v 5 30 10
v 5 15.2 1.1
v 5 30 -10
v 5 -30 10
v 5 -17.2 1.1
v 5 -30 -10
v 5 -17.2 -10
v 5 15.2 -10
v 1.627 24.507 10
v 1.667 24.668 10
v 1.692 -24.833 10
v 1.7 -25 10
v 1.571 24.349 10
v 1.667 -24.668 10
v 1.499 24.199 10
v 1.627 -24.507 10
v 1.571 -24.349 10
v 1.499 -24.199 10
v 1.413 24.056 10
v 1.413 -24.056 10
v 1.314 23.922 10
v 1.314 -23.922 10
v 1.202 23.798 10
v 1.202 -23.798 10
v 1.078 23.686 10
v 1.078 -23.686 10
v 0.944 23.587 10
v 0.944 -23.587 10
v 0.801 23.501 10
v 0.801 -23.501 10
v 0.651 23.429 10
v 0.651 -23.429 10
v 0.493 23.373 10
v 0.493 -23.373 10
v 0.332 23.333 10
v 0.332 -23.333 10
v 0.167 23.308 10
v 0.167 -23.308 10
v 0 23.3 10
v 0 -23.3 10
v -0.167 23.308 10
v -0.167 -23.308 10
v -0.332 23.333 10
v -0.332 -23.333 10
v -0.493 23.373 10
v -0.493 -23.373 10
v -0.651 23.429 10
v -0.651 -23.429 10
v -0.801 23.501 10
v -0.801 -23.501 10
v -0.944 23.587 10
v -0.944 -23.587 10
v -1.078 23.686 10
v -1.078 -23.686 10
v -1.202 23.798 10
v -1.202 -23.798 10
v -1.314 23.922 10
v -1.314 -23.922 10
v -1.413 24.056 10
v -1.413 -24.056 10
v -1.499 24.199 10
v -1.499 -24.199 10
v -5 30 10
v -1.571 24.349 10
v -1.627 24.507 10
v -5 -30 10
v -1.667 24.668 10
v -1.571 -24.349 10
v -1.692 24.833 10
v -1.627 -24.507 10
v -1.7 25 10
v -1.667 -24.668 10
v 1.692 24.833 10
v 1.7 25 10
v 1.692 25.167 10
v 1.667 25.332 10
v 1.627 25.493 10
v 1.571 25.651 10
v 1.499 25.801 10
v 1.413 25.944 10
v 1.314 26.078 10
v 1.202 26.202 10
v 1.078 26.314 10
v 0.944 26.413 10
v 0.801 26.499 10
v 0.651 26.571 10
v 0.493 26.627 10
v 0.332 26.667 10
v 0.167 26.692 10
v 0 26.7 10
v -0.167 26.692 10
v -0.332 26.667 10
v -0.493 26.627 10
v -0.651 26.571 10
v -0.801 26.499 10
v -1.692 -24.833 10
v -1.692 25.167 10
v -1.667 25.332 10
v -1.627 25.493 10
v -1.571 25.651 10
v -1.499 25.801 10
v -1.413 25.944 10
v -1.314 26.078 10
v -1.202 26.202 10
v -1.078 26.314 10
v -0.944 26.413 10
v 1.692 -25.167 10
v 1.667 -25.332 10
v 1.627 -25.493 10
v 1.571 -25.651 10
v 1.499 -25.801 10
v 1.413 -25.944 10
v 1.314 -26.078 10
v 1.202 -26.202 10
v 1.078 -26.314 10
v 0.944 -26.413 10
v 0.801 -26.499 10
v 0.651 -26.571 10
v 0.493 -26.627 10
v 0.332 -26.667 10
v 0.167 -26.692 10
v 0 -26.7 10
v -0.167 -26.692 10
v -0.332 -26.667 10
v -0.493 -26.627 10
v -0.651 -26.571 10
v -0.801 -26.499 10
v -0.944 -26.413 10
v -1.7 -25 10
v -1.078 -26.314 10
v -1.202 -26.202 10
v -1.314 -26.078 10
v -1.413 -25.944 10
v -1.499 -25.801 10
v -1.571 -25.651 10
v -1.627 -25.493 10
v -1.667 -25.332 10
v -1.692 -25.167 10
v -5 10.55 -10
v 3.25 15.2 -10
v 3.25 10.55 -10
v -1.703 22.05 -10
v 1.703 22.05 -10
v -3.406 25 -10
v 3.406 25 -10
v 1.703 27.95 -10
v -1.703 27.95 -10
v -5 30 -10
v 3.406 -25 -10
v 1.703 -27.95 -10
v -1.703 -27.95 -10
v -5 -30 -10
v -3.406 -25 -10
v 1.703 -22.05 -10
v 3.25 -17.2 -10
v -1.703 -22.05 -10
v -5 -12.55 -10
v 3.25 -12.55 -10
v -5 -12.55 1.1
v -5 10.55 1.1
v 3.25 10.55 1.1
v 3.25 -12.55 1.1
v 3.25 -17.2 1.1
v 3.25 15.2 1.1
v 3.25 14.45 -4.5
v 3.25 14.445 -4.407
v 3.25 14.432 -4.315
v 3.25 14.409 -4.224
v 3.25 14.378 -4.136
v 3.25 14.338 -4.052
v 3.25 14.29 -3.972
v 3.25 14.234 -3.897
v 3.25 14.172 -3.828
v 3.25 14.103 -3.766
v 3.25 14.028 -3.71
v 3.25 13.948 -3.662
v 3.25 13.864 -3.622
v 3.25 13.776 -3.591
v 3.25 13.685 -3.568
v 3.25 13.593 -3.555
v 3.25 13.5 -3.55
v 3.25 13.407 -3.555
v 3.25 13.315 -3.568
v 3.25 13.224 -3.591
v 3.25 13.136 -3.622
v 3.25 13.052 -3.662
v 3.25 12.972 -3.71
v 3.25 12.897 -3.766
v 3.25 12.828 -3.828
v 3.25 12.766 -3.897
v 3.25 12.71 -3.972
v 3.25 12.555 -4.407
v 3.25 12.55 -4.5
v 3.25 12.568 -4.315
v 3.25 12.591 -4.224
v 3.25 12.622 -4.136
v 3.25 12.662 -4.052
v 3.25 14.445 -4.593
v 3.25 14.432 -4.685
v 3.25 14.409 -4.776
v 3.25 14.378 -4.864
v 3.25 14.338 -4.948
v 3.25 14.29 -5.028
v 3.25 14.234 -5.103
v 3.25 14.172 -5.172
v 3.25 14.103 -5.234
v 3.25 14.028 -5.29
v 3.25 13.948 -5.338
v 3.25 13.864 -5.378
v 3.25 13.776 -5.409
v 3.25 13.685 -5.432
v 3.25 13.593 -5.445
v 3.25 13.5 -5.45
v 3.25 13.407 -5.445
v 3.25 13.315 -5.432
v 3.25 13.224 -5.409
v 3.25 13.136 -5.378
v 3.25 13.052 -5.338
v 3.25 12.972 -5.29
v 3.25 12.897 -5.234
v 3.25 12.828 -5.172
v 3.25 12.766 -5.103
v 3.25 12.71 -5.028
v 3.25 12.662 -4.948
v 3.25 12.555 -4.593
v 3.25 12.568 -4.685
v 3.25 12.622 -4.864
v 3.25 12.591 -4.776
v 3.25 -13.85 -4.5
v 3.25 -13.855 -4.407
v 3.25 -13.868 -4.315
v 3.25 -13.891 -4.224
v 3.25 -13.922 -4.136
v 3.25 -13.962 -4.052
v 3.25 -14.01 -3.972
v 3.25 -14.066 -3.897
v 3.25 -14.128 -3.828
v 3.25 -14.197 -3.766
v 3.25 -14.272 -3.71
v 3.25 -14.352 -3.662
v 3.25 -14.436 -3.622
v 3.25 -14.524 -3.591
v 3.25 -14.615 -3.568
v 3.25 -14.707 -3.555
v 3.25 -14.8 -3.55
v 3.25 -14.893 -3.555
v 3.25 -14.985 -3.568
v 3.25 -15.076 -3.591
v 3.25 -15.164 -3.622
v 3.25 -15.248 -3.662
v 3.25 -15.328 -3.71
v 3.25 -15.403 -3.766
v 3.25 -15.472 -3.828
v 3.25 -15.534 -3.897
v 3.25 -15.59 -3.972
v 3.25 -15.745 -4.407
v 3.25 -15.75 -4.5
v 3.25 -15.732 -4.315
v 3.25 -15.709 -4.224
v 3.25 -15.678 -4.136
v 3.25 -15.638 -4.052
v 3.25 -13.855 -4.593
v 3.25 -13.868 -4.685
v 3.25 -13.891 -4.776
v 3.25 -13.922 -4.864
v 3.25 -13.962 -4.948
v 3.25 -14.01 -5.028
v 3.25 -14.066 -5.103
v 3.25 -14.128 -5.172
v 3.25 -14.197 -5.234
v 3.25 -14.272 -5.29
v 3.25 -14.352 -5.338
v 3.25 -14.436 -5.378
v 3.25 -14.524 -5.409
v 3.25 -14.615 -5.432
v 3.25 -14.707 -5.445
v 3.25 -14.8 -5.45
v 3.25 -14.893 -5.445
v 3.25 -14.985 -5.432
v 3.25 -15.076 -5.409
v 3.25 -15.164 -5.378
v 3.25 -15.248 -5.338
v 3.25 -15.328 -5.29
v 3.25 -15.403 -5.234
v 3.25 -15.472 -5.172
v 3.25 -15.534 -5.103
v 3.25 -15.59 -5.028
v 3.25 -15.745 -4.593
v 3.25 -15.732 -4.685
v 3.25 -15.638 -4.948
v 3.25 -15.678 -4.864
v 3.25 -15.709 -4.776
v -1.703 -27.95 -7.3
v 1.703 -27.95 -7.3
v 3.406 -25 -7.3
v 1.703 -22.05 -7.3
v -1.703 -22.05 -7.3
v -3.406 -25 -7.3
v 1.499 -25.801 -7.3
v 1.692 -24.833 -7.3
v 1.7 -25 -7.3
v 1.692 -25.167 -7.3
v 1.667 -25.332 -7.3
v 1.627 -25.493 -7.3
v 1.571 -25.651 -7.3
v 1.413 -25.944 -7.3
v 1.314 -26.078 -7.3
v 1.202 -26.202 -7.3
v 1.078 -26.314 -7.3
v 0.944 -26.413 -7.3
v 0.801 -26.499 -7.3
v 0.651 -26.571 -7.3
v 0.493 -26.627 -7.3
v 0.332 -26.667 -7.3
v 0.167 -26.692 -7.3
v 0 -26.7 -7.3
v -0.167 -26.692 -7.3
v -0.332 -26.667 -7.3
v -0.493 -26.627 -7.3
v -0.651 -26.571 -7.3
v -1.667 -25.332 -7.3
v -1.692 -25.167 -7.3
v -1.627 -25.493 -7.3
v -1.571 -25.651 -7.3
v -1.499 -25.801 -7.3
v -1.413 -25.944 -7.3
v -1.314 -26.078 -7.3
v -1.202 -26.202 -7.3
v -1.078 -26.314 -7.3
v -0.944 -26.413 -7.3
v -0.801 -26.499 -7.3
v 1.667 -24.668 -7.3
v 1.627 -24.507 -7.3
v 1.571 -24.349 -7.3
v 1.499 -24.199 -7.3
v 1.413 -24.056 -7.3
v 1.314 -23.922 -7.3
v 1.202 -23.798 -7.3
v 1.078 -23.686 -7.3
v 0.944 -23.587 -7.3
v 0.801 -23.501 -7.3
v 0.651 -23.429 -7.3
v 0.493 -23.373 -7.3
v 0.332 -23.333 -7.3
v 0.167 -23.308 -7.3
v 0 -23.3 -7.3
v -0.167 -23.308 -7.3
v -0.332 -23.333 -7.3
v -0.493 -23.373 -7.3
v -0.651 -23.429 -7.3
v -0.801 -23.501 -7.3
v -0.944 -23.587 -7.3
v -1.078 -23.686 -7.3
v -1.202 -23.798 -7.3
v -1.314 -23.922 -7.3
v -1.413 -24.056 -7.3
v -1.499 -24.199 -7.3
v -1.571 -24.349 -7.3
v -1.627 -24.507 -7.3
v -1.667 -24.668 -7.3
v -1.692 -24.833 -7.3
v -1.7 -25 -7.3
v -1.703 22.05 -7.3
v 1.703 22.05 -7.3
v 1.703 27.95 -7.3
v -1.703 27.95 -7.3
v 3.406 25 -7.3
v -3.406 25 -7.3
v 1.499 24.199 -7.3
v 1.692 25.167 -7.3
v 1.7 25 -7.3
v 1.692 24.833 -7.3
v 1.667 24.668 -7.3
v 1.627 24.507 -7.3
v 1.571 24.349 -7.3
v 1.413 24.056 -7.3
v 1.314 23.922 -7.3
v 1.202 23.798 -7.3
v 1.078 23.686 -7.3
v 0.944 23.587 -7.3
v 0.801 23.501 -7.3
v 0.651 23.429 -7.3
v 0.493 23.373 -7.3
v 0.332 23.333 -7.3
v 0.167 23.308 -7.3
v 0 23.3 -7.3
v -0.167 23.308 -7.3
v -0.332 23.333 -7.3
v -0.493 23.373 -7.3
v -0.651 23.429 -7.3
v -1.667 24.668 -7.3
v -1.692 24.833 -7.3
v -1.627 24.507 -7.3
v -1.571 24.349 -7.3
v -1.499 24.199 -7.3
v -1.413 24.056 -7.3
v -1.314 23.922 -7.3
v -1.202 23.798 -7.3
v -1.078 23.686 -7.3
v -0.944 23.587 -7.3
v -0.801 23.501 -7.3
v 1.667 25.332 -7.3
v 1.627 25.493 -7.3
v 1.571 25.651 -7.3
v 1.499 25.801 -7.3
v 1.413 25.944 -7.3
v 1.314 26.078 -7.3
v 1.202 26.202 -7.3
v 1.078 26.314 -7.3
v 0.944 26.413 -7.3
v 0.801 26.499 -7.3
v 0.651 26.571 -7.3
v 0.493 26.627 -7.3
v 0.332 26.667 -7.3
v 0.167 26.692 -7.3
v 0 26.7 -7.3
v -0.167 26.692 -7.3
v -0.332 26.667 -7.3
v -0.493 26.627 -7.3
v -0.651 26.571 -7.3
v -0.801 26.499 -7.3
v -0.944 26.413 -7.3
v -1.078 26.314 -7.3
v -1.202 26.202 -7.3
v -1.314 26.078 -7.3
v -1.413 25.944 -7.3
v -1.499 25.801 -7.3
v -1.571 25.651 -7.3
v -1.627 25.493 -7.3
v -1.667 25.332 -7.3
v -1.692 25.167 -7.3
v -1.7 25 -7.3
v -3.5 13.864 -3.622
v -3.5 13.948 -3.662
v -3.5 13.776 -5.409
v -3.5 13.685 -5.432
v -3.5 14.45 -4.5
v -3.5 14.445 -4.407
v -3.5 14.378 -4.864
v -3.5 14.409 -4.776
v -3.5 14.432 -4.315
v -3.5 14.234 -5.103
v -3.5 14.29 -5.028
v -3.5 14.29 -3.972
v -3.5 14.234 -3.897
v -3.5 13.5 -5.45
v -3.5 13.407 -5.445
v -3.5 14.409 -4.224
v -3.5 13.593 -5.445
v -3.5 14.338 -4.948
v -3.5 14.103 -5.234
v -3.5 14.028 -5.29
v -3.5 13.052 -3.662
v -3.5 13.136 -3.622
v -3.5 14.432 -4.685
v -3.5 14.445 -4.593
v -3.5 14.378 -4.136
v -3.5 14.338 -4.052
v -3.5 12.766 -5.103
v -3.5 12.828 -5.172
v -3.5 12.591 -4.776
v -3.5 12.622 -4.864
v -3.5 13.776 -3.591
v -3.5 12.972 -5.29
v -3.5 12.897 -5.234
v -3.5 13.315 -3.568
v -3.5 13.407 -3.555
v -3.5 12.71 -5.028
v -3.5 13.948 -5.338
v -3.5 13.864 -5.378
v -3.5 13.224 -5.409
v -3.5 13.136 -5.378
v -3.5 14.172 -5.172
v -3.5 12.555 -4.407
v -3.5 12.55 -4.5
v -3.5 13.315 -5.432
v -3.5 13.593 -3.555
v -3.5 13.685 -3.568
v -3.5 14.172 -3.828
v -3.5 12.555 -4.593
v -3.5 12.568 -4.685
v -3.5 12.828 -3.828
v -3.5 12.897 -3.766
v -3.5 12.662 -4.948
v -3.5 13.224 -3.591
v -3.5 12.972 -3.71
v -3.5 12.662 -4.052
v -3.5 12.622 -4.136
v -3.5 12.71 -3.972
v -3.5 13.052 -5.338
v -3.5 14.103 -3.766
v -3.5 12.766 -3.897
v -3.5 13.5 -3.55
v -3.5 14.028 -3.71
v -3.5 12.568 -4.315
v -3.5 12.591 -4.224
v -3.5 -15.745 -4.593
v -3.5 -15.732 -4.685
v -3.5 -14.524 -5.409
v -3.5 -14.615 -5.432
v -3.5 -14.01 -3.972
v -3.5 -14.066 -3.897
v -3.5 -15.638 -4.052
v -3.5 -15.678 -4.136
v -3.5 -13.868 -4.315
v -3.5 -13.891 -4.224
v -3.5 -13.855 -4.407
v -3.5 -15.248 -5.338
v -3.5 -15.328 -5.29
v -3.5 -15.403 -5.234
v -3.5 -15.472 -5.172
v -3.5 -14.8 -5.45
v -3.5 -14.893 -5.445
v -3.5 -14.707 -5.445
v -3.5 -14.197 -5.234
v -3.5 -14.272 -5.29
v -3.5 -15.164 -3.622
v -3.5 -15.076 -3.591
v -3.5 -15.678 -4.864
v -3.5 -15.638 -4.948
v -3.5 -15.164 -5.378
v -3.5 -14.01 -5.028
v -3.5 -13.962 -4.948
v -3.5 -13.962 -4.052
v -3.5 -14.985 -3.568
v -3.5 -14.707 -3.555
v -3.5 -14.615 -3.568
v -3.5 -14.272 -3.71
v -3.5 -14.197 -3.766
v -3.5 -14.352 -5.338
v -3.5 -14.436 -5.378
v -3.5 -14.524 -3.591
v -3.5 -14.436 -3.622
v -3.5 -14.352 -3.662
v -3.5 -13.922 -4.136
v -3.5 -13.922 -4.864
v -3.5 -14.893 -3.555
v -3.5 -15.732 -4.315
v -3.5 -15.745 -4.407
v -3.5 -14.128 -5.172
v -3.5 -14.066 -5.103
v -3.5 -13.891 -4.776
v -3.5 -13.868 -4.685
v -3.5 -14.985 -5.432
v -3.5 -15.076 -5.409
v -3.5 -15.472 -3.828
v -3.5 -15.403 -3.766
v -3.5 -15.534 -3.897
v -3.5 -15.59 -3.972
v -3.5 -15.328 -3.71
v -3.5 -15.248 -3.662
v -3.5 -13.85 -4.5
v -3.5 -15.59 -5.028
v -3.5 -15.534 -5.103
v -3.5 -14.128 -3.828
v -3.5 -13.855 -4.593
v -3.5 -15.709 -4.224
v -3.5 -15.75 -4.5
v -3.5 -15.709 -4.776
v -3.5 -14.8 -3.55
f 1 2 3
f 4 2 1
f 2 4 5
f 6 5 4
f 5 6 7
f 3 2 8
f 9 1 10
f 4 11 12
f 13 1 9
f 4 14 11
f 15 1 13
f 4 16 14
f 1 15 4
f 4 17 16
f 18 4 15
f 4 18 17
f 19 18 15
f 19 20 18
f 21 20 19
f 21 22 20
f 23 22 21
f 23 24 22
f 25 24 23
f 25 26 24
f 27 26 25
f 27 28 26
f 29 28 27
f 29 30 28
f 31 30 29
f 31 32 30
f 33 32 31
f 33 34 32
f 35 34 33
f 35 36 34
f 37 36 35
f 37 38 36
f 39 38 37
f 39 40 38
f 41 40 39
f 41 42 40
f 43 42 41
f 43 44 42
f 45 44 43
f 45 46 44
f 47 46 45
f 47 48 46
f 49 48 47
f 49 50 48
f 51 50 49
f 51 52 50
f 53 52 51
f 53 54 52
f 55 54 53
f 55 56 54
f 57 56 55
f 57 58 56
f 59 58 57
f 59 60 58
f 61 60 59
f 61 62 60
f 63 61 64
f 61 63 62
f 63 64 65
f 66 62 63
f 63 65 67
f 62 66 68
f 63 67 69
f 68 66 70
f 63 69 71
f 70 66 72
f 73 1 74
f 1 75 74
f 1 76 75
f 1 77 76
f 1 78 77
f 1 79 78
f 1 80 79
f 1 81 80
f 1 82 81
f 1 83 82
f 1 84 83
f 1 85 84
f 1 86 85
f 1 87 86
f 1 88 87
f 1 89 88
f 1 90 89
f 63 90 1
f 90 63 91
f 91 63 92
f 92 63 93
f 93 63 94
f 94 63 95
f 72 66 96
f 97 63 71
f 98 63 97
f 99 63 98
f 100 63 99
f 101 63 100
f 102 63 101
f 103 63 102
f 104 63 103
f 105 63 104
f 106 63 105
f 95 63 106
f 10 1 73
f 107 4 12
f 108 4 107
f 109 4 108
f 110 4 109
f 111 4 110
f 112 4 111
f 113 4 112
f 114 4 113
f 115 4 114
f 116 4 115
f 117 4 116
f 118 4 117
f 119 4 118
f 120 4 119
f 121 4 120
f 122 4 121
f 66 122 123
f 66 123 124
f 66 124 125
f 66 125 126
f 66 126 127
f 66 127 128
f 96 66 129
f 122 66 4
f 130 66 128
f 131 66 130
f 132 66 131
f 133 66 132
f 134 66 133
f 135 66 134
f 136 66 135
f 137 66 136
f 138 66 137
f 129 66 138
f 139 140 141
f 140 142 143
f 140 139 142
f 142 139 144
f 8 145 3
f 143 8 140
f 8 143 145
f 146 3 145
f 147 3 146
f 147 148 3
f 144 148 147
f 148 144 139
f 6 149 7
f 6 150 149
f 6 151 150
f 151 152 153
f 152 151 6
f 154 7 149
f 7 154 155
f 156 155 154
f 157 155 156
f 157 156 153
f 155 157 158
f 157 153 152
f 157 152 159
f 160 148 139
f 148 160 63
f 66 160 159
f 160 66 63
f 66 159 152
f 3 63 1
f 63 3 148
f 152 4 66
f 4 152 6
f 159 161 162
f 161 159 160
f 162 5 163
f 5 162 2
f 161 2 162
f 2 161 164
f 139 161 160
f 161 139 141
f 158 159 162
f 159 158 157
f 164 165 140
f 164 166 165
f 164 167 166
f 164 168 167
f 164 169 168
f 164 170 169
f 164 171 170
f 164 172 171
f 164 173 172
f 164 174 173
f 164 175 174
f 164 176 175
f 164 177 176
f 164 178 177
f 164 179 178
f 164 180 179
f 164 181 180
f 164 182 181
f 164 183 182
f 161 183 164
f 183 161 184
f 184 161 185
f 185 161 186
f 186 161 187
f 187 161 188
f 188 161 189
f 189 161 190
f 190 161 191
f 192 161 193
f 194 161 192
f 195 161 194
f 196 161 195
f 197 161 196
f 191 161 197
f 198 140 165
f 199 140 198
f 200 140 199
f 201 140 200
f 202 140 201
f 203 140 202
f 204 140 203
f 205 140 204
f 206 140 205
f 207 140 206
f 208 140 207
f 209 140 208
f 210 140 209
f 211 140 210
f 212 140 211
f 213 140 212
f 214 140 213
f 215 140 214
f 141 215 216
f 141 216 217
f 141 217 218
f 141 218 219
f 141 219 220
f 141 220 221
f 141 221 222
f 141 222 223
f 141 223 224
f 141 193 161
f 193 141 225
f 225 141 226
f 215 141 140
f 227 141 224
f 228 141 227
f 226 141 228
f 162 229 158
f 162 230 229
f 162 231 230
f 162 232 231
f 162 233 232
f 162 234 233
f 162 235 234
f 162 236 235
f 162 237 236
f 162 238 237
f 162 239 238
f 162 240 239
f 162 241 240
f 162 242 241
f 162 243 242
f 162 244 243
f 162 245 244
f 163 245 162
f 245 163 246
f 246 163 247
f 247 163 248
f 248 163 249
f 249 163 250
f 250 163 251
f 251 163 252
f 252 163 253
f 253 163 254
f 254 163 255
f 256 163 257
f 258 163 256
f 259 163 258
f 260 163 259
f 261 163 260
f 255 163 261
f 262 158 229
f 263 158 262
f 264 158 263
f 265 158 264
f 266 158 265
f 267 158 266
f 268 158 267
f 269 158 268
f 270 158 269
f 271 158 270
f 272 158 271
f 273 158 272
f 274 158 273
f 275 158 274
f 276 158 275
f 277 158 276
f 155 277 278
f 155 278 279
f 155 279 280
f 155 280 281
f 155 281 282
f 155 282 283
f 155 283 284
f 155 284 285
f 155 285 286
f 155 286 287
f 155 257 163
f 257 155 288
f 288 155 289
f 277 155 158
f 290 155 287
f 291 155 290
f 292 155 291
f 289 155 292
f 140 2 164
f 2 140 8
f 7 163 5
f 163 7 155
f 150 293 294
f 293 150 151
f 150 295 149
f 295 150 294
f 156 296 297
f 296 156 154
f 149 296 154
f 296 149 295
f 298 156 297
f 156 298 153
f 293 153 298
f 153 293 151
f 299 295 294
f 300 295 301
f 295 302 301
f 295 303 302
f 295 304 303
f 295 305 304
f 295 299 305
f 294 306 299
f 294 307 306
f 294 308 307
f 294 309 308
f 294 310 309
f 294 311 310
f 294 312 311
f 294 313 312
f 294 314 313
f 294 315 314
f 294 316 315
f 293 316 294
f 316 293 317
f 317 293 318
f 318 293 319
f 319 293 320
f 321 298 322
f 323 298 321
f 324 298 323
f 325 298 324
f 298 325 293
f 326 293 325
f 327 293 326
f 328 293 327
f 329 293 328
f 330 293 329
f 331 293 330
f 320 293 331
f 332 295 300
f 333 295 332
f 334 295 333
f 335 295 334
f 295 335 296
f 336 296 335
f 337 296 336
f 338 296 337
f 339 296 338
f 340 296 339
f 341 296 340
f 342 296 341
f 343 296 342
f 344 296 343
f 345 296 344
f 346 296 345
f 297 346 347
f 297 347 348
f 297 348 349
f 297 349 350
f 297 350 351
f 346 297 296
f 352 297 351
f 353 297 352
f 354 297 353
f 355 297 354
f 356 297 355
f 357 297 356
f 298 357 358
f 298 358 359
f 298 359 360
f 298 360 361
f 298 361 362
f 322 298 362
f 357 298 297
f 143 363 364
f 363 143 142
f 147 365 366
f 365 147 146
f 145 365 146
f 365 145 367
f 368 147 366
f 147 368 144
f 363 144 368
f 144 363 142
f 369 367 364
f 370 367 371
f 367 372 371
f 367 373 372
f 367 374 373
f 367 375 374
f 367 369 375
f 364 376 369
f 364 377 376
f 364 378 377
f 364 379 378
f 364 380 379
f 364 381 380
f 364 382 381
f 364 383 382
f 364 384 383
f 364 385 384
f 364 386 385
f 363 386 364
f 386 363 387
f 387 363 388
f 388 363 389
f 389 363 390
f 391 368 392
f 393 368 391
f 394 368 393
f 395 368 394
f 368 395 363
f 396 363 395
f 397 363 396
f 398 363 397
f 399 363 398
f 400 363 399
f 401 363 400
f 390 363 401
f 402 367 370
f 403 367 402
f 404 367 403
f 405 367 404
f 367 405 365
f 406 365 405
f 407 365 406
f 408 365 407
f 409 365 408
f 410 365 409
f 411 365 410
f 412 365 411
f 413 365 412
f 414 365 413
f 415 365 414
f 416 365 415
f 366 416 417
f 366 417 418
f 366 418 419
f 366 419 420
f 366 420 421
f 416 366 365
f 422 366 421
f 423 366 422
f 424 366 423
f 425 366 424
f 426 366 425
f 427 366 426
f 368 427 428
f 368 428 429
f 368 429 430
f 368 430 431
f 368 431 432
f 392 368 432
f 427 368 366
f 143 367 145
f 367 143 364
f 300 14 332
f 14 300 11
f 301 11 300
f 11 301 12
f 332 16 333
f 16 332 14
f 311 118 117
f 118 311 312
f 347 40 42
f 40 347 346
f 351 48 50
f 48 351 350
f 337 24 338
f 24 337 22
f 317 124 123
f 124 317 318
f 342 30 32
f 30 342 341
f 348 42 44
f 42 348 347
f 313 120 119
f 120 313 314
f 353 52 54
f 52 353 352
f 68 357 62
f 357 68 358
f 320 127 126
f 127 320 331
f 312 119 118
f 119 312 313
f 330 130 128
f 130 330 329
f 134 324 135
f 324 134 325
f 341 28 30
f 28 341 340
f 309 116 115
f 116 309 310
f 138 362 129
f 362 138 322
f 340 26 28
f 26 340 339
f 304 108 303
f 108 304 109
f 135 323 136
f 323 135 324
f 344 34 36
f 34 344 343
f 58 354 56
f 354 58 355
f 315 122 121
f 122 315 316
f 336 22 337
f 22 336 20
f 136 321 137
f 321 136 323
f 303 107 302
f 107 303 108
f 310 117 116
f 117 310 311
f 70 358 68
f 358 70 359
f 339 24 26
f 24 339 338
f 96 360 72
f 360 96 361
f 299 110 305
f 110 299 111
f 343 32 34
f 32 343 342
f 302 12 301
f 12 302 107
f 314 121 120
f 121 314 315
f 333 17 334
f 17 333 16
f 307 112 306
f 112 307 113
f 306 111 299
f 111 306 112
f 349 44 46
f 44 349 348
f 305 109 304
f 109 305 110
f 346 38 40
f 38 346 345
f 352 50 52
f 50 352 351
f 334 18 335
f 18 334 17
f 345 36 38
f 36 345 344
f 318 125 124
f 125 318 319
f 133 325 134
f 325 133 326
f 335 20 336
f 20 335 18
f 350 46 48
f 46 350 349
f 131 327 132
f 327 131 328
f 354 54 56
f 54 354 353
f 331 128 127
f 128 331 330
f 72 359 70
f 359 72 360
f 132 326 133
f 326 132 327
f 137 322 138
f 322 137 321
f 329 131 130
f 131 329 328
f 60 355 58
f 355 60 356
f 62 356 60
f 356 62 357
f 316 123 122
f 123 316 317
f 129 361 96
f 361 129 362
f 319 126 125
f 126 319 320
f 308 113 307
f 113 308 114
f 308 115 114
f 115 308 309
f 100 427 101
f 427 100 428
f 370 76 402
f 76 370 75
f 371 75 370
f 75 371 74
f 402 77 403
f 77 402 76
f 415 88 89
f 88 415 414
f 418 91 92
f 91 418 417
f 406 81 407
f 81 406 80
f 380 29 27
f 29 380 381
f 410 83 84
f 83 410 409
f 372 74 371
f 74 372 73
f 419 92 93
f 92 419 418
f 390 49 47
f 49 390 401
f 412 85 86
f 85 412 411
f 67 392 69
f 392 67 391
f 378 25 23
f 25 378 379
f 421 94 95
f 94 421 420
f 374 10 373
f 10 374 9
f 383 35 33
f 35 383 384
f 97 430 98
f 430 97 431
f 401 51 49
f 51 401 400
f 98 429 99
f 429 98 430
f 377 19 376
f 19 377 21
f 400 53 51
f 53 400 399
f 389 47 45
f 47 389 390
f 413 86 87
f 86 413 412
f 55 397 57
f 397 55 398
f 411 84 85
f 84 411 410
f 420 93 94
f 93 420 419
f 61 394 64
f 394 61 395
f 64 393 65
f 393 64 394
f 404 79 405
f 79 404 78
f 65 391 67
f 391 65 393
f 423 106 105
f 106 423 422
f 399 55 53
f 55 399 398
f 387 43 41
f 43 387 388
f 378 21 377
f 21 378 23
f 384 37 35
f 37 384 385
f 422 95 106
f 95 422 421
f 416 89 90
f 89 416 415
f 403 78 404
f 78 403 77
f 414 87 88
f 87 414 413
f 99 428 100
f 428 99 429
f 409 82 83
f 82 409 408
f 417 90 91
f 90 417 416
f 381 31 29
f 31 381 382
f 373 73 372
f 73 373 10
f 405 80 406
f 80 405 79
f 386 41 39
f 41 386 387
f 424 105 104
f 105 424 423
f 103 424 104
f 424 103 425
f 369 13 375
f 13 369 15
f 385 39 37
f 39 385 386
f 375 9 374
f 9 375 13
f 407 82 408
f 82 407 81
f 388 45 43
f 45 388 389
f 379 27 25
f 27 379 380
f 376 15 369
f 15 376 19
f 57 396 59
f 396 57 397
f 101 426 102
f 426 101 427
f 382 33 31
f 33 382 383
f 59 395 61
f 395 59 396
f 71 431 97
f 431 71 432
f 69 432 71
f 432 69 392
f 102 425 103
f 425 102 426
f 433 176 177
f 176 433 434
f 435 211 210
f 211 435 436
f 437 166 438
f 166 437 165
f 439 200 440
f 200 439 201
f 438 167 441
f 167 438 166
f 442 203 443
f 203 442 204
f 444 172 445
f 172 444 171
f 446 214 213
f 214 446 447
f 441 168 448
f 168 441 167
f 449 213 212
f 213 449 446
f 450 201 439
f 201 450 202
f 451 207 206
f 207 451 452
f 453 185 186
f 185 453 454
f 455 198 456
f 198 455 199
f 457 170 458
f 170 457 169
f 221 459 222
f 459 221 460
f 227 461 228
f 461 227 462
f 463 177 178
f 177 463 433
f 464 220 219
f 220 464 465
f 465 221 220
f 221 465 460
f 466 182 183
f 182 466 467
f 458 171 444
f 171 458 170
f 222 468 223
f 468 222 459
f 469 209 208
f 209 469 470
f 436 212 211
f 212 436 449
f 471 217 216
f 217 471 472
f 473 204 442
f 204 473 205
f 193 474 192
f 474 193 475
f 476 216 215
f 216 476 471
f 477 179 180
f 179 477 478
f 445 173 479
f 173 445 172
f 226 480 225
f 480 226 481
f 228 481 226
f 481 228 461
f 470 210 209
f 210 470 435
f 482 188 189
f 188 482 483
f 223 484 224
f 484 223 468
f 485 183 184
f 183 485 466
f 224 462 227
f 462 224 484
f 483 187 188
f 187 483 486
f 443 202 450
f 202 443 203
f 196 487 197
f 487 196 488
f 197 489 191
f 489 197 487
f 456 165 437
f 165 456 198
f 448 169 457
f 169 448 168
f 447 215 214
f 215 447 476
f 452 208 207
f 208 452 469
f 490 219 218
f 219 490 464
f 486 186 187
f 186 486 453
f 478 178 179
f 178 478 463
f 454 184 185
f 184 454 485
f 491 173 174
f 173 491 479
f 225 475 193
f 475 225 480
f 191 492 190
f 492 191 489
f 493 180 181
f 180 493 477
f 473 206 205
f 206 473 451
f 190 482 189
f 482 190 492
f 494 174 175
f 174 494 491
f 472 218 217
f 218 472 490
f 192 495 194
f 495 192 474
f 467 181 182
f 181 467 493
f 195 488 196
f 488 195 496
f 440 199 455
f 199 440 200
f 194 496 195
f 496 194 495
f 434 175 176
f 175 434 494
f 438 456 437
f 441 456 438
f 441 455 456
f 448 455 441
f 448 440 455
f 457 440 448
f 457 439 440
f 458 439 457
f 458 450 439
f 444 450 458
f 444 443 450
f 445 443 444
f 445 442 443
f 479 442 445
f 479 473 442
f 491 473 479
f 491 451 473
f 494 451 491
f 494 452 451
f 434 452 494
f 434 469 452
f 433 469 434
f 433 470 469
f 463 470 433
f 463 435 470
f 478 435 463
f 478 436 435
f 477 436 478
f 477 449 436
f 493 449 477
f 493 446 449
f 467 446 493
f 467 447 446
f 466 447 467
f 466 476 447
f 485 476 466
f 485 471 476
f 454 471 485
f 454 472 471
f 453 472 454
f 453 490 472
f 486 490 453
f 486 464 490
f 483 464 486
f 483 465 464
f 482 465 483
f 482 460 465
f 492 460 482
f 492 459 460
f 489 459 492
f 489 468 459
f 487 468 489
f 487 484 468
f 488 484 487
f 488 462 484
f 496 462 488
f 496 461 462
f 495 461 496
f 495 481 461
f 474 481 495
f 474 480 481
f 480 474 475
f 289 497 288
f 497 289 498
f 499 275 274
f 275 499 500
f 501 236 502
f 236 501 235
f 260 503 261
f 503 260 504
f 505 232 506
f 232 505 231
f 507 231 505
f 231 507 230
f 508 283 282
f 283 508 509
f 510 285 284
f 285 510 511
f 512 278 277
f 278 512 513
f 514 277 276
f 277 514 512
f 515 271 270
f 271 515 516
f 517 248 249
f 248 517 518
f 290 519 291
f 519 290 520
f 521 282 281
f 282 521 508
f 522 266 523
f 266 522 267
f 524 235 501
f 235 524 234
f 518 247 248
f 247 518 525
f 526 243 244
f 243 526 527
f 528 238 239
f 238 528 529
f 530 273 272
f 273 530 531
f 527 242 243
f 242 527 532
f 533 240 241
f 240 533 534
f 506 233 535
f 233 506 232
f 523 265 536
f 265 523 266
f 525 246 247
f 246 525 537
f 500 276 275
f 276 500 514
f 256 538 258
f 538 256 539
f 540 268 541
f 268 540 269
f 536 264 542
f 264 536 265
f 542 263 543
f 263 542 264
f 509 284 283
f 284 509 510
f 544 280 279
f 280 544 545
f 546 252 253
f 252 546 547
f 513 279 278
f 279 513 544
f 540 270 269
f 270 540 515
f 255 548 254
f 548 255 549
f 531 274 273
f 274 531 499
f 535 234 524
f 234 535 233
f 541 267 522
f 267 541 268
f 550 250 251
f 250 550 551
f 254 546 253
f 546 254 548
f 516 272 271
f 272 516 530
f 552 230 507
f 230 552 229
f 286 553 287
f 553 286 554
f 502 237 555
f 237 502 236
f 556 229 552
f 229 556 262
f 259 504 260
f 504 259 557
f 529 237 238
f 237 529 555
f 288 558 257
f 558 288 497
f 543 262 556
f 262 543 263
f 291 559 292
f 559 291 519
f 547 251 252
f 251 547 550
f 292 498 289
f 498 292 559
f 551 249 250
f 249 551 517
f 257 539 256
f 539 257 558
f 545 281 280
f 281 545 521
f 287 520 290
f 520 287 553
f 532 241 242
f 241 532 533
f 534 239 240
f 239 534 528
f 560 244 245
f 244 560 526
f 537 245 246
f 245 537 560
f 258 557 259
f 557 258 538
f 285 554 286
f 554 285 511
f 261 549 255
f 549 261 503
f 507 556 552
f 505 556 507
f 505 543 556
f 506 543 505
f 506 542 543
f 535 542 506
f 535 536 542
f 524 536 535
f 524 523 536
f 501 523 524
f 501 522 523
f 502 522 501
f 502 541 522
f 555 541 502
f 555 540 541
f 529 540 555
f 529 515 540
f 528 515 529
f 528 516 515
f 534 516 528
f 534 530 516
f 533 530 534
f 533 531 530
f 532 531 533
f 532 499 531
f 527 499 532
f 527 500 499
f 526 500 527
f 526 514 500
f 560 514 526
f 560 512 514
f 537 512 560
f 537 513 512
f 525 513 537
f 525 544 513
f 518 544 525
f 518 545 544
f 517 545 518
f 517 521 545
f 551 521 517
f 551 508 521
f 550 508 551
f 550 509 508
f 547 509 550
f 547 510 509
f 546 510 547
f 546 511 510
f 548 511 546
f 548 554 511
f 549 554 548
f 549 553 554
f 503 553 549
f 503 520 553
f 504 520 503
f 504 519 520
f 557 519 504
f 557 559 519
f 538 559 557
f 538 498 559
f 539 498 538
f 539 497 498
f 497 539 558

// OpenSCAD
Lang_Nummer = 2*(5.5+0.4) / sqrt(3);

difference(){

//MiniMøiser

translate([0,0,0])
cube([10,60,20],center=true);
translate([0,-1,-5])
    cube([11,23.1,12.2],center=true);

//In'ak
translate([4.2,-1,-5])
    cube([1.9,32.4,12.2],center=true);

//Måtrik'åller
translate([0,-25,-10])
   cylinder(d=Lang_Nummer, h=5.4,$fn=6, center=true); 

    translate([0,25,-10])
   cylinder(d=Lang_Nummer, h=5.4,$fn=6, center=true); 
    
  //Små'åller
    translate([0,-25,0])
   cylinder(d=3.4, h=70,$fn=64,center=true); 
   

   
       translate([0,25,0])
   cylinder(d=3.4, h=70,$fn=64,center=true); 
   
   
   //Små in'ak 'uller
rotate([0,90,0])
translate([4.5,13.5,0])
    cylinder(d=1.9, h=7,$fn=64,center=true);
    
rotate([0,90,0])
translate([4.5,-14.8,0])
    cylinder(d=1.9, h=7,$fn=64,center=true);
}
